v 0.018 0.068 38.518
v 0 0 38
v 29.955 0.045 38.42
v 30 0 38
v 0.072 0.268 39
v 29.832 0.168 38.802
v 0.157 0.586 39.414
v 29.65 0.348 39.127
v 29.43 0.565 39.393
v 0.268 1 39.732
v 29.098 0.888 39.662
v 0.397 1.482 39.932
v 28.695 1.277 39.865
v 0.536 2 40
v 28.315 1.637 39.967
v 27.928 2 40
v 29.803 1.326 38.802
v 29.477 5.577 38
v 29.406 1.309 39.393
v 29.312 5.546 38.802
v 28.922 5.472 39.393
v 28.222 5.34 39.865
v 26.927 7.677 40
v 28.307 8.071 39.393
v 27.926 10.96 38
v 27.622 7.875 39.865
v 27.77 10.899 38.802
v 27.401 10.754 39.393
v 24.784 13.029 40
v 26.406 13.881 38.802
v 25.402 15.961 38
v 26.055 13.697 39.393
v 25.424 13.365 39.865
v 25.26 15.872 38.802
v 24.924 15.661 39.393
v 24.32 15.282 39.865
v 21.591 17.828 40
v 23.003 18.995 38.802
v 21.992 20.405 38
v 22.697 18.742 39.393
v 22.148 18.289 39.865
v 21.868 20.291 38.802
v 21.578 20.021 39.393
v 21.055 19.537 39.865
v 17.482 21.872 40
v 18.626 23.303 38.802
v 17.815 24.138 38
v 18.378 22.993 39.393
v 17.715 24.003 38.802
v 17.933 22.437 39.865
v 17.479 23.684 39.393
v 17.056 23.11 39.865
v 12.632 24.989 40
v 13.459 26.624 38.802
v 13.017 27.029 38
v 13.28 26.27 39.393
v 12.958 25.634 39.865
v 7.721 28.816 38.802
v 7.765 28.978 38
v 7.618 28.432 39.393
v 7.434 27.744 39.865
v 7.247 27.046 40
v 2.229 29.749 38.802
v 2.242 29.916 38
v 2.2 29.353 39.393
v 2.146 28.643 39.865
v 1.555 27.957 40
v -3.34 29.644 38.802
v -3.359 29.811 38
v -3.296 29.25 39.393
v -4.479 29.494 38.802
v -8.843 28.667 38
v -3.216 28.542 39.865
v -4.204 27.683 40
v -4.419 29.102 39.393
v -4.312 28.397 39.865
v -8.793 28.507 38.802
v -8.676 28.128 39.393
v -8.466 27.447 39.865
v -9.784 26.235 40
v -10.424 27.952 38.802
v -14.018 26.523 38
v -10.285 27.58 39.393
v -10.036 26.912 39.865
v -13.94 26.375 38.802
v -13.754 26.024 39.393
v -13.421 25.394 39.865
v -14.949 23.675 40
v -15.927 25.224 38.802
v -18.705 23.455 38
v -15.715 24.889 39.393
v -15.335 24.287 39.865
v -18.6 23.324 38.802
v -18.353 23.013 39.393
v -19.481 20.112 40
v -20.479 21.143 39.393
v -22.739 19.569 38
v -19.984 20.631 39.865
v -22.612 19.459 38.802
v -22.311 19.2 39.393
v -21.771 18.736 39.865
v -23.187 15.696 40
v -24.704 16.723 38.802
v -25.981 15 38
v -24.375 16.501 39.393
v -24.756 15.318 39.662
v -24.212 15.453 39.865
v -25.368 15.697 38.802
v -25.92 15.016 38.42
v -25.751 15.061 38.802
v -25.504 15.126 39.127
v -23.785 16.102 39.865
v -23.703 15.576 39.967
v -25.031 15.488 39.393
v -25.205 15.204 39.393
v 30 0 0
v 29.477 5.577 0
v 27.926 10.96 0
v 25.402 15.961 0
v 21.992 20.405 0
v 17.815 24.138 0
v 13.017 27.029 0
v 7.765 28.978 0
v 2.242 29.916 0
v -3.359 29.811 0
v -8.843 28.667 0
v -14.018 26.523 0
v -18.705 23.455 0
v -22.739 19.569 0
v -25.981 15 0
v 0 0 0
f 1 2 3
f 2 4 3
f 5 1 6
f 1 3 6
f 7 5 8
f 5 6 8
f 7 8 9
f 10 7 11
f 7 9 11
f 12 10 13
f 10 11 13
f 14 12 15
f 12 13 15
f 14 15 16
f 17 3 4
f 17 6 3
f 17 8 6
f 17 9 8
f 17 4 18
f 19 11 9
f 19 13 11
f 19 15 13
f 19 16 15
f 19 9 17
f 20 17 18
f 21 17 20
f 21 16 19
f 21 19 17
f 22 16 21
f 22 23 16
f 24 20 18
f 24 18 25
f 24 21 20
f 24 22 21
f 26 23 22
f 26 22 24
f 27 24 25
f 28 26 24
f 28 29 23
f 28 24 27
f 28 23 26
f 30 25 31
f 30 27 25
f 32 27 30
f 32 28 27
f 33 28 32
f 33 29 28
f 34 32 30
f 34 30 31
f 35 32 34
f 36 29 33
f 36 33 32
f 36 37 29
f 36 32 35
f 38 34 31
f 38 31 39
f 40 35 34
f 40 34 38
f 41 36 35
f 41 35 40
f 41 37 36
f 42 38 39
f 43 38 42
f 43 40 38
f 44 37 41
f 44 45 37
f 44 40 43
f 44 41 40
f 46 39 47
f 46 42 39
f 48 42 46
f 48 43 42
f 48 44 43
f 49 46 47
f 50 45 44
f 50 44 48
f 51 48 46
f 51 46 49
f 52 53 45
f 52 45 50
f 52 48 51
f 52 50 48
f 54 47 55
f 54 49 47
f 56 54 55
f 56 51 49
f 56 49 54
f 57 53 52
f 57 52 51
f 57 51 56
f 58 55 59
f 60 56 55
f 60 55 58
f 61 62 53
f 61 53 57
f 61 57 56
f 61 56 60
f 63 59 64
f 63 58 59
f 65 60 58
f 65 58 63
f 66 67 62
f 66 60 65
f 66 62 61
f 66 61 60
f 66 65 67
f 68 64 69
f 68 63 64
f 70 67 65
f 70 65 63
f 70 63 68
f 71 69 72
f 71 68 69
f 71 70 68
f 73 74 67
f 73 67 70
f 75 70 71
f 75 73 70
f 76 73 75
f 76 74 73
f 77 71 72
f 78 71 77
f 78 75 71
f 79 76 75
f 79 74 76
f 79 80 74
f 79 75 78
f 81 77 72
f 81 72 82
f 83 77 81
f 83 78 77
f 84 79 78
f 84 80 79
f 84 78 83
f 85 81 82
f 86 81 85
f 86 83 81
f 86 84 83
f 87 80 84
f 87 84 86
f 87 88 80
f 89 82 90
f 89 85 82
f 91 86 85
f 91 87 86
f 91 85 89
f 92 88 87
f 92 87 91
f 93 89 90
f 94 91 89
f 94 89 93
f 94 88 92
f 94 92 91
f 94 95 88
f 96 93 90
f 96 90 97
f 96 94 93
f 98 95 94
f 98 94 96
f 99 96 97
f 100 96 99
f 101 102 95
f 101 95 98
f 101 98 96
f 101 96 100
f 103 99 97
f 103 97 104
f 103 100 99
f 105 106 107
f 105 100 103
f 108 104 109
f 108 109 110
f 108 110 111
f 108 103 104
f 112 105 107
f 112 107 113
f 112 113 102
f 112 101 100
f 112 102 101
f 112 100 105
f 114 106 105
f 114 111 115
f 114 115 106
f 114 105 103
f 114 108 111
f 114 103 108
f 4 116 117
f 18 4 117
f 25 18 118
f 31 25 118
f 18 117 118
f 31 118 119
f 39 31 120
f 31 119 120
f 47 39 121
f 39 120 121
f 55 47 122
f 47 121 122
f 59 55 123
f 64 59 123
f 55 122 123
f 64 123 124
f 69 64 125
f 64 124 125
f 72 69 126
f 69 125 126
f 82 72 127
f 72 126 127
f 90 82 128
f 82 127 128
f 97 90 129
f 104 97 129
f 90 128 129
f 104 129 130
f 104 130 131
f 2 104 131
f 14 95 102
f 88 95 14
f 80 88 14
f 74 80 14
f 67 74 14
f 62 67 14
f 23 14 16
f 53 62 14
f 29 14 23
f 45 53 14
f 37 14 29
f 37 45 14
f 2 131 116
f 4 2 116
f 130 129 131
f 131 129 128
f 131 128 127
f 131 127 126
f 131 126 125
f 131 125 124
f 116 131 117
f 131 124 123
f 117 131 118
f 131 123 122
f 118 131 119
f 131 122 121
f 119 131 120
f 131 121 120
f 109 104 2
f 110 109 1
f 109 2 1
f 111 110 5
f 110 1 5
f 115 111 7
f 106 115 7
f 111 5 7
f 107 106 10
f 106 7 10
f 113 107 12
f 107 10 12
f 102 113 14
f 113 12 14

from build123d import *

# Parameters (mm, degrees)
BOSS_EXTRUDE1_DEPTH = 40
FILLET1_R           = 2


with BuildPart() as part:
    # Sketch1 → Boss-Extrude1 (new body)
    with BuildSketch(Plane.XY):
        with BuildLine():
            Line((-25.980762114, 15), (0, 0))
            Line((0, 0), (30, 0))
            ThreePointArc((30, 0), (7.764571353, 28.977774789), (-25.980762114, 15))
        make_face()
    extrude(amount=BOSS_EXTRUDE1_DEPTH)

    # Fillet1
    fillet1_edges = [part.edges().sort_by_distance(p)[0] for p in [
        (-12.990381057, 7.5, 40),
        (15, 0, 40),
        (7.764571353, 28.977774789, 40),
    ]]
    fillet(fillet1_edges, radius=FILLET1_R)


solid = part.part
